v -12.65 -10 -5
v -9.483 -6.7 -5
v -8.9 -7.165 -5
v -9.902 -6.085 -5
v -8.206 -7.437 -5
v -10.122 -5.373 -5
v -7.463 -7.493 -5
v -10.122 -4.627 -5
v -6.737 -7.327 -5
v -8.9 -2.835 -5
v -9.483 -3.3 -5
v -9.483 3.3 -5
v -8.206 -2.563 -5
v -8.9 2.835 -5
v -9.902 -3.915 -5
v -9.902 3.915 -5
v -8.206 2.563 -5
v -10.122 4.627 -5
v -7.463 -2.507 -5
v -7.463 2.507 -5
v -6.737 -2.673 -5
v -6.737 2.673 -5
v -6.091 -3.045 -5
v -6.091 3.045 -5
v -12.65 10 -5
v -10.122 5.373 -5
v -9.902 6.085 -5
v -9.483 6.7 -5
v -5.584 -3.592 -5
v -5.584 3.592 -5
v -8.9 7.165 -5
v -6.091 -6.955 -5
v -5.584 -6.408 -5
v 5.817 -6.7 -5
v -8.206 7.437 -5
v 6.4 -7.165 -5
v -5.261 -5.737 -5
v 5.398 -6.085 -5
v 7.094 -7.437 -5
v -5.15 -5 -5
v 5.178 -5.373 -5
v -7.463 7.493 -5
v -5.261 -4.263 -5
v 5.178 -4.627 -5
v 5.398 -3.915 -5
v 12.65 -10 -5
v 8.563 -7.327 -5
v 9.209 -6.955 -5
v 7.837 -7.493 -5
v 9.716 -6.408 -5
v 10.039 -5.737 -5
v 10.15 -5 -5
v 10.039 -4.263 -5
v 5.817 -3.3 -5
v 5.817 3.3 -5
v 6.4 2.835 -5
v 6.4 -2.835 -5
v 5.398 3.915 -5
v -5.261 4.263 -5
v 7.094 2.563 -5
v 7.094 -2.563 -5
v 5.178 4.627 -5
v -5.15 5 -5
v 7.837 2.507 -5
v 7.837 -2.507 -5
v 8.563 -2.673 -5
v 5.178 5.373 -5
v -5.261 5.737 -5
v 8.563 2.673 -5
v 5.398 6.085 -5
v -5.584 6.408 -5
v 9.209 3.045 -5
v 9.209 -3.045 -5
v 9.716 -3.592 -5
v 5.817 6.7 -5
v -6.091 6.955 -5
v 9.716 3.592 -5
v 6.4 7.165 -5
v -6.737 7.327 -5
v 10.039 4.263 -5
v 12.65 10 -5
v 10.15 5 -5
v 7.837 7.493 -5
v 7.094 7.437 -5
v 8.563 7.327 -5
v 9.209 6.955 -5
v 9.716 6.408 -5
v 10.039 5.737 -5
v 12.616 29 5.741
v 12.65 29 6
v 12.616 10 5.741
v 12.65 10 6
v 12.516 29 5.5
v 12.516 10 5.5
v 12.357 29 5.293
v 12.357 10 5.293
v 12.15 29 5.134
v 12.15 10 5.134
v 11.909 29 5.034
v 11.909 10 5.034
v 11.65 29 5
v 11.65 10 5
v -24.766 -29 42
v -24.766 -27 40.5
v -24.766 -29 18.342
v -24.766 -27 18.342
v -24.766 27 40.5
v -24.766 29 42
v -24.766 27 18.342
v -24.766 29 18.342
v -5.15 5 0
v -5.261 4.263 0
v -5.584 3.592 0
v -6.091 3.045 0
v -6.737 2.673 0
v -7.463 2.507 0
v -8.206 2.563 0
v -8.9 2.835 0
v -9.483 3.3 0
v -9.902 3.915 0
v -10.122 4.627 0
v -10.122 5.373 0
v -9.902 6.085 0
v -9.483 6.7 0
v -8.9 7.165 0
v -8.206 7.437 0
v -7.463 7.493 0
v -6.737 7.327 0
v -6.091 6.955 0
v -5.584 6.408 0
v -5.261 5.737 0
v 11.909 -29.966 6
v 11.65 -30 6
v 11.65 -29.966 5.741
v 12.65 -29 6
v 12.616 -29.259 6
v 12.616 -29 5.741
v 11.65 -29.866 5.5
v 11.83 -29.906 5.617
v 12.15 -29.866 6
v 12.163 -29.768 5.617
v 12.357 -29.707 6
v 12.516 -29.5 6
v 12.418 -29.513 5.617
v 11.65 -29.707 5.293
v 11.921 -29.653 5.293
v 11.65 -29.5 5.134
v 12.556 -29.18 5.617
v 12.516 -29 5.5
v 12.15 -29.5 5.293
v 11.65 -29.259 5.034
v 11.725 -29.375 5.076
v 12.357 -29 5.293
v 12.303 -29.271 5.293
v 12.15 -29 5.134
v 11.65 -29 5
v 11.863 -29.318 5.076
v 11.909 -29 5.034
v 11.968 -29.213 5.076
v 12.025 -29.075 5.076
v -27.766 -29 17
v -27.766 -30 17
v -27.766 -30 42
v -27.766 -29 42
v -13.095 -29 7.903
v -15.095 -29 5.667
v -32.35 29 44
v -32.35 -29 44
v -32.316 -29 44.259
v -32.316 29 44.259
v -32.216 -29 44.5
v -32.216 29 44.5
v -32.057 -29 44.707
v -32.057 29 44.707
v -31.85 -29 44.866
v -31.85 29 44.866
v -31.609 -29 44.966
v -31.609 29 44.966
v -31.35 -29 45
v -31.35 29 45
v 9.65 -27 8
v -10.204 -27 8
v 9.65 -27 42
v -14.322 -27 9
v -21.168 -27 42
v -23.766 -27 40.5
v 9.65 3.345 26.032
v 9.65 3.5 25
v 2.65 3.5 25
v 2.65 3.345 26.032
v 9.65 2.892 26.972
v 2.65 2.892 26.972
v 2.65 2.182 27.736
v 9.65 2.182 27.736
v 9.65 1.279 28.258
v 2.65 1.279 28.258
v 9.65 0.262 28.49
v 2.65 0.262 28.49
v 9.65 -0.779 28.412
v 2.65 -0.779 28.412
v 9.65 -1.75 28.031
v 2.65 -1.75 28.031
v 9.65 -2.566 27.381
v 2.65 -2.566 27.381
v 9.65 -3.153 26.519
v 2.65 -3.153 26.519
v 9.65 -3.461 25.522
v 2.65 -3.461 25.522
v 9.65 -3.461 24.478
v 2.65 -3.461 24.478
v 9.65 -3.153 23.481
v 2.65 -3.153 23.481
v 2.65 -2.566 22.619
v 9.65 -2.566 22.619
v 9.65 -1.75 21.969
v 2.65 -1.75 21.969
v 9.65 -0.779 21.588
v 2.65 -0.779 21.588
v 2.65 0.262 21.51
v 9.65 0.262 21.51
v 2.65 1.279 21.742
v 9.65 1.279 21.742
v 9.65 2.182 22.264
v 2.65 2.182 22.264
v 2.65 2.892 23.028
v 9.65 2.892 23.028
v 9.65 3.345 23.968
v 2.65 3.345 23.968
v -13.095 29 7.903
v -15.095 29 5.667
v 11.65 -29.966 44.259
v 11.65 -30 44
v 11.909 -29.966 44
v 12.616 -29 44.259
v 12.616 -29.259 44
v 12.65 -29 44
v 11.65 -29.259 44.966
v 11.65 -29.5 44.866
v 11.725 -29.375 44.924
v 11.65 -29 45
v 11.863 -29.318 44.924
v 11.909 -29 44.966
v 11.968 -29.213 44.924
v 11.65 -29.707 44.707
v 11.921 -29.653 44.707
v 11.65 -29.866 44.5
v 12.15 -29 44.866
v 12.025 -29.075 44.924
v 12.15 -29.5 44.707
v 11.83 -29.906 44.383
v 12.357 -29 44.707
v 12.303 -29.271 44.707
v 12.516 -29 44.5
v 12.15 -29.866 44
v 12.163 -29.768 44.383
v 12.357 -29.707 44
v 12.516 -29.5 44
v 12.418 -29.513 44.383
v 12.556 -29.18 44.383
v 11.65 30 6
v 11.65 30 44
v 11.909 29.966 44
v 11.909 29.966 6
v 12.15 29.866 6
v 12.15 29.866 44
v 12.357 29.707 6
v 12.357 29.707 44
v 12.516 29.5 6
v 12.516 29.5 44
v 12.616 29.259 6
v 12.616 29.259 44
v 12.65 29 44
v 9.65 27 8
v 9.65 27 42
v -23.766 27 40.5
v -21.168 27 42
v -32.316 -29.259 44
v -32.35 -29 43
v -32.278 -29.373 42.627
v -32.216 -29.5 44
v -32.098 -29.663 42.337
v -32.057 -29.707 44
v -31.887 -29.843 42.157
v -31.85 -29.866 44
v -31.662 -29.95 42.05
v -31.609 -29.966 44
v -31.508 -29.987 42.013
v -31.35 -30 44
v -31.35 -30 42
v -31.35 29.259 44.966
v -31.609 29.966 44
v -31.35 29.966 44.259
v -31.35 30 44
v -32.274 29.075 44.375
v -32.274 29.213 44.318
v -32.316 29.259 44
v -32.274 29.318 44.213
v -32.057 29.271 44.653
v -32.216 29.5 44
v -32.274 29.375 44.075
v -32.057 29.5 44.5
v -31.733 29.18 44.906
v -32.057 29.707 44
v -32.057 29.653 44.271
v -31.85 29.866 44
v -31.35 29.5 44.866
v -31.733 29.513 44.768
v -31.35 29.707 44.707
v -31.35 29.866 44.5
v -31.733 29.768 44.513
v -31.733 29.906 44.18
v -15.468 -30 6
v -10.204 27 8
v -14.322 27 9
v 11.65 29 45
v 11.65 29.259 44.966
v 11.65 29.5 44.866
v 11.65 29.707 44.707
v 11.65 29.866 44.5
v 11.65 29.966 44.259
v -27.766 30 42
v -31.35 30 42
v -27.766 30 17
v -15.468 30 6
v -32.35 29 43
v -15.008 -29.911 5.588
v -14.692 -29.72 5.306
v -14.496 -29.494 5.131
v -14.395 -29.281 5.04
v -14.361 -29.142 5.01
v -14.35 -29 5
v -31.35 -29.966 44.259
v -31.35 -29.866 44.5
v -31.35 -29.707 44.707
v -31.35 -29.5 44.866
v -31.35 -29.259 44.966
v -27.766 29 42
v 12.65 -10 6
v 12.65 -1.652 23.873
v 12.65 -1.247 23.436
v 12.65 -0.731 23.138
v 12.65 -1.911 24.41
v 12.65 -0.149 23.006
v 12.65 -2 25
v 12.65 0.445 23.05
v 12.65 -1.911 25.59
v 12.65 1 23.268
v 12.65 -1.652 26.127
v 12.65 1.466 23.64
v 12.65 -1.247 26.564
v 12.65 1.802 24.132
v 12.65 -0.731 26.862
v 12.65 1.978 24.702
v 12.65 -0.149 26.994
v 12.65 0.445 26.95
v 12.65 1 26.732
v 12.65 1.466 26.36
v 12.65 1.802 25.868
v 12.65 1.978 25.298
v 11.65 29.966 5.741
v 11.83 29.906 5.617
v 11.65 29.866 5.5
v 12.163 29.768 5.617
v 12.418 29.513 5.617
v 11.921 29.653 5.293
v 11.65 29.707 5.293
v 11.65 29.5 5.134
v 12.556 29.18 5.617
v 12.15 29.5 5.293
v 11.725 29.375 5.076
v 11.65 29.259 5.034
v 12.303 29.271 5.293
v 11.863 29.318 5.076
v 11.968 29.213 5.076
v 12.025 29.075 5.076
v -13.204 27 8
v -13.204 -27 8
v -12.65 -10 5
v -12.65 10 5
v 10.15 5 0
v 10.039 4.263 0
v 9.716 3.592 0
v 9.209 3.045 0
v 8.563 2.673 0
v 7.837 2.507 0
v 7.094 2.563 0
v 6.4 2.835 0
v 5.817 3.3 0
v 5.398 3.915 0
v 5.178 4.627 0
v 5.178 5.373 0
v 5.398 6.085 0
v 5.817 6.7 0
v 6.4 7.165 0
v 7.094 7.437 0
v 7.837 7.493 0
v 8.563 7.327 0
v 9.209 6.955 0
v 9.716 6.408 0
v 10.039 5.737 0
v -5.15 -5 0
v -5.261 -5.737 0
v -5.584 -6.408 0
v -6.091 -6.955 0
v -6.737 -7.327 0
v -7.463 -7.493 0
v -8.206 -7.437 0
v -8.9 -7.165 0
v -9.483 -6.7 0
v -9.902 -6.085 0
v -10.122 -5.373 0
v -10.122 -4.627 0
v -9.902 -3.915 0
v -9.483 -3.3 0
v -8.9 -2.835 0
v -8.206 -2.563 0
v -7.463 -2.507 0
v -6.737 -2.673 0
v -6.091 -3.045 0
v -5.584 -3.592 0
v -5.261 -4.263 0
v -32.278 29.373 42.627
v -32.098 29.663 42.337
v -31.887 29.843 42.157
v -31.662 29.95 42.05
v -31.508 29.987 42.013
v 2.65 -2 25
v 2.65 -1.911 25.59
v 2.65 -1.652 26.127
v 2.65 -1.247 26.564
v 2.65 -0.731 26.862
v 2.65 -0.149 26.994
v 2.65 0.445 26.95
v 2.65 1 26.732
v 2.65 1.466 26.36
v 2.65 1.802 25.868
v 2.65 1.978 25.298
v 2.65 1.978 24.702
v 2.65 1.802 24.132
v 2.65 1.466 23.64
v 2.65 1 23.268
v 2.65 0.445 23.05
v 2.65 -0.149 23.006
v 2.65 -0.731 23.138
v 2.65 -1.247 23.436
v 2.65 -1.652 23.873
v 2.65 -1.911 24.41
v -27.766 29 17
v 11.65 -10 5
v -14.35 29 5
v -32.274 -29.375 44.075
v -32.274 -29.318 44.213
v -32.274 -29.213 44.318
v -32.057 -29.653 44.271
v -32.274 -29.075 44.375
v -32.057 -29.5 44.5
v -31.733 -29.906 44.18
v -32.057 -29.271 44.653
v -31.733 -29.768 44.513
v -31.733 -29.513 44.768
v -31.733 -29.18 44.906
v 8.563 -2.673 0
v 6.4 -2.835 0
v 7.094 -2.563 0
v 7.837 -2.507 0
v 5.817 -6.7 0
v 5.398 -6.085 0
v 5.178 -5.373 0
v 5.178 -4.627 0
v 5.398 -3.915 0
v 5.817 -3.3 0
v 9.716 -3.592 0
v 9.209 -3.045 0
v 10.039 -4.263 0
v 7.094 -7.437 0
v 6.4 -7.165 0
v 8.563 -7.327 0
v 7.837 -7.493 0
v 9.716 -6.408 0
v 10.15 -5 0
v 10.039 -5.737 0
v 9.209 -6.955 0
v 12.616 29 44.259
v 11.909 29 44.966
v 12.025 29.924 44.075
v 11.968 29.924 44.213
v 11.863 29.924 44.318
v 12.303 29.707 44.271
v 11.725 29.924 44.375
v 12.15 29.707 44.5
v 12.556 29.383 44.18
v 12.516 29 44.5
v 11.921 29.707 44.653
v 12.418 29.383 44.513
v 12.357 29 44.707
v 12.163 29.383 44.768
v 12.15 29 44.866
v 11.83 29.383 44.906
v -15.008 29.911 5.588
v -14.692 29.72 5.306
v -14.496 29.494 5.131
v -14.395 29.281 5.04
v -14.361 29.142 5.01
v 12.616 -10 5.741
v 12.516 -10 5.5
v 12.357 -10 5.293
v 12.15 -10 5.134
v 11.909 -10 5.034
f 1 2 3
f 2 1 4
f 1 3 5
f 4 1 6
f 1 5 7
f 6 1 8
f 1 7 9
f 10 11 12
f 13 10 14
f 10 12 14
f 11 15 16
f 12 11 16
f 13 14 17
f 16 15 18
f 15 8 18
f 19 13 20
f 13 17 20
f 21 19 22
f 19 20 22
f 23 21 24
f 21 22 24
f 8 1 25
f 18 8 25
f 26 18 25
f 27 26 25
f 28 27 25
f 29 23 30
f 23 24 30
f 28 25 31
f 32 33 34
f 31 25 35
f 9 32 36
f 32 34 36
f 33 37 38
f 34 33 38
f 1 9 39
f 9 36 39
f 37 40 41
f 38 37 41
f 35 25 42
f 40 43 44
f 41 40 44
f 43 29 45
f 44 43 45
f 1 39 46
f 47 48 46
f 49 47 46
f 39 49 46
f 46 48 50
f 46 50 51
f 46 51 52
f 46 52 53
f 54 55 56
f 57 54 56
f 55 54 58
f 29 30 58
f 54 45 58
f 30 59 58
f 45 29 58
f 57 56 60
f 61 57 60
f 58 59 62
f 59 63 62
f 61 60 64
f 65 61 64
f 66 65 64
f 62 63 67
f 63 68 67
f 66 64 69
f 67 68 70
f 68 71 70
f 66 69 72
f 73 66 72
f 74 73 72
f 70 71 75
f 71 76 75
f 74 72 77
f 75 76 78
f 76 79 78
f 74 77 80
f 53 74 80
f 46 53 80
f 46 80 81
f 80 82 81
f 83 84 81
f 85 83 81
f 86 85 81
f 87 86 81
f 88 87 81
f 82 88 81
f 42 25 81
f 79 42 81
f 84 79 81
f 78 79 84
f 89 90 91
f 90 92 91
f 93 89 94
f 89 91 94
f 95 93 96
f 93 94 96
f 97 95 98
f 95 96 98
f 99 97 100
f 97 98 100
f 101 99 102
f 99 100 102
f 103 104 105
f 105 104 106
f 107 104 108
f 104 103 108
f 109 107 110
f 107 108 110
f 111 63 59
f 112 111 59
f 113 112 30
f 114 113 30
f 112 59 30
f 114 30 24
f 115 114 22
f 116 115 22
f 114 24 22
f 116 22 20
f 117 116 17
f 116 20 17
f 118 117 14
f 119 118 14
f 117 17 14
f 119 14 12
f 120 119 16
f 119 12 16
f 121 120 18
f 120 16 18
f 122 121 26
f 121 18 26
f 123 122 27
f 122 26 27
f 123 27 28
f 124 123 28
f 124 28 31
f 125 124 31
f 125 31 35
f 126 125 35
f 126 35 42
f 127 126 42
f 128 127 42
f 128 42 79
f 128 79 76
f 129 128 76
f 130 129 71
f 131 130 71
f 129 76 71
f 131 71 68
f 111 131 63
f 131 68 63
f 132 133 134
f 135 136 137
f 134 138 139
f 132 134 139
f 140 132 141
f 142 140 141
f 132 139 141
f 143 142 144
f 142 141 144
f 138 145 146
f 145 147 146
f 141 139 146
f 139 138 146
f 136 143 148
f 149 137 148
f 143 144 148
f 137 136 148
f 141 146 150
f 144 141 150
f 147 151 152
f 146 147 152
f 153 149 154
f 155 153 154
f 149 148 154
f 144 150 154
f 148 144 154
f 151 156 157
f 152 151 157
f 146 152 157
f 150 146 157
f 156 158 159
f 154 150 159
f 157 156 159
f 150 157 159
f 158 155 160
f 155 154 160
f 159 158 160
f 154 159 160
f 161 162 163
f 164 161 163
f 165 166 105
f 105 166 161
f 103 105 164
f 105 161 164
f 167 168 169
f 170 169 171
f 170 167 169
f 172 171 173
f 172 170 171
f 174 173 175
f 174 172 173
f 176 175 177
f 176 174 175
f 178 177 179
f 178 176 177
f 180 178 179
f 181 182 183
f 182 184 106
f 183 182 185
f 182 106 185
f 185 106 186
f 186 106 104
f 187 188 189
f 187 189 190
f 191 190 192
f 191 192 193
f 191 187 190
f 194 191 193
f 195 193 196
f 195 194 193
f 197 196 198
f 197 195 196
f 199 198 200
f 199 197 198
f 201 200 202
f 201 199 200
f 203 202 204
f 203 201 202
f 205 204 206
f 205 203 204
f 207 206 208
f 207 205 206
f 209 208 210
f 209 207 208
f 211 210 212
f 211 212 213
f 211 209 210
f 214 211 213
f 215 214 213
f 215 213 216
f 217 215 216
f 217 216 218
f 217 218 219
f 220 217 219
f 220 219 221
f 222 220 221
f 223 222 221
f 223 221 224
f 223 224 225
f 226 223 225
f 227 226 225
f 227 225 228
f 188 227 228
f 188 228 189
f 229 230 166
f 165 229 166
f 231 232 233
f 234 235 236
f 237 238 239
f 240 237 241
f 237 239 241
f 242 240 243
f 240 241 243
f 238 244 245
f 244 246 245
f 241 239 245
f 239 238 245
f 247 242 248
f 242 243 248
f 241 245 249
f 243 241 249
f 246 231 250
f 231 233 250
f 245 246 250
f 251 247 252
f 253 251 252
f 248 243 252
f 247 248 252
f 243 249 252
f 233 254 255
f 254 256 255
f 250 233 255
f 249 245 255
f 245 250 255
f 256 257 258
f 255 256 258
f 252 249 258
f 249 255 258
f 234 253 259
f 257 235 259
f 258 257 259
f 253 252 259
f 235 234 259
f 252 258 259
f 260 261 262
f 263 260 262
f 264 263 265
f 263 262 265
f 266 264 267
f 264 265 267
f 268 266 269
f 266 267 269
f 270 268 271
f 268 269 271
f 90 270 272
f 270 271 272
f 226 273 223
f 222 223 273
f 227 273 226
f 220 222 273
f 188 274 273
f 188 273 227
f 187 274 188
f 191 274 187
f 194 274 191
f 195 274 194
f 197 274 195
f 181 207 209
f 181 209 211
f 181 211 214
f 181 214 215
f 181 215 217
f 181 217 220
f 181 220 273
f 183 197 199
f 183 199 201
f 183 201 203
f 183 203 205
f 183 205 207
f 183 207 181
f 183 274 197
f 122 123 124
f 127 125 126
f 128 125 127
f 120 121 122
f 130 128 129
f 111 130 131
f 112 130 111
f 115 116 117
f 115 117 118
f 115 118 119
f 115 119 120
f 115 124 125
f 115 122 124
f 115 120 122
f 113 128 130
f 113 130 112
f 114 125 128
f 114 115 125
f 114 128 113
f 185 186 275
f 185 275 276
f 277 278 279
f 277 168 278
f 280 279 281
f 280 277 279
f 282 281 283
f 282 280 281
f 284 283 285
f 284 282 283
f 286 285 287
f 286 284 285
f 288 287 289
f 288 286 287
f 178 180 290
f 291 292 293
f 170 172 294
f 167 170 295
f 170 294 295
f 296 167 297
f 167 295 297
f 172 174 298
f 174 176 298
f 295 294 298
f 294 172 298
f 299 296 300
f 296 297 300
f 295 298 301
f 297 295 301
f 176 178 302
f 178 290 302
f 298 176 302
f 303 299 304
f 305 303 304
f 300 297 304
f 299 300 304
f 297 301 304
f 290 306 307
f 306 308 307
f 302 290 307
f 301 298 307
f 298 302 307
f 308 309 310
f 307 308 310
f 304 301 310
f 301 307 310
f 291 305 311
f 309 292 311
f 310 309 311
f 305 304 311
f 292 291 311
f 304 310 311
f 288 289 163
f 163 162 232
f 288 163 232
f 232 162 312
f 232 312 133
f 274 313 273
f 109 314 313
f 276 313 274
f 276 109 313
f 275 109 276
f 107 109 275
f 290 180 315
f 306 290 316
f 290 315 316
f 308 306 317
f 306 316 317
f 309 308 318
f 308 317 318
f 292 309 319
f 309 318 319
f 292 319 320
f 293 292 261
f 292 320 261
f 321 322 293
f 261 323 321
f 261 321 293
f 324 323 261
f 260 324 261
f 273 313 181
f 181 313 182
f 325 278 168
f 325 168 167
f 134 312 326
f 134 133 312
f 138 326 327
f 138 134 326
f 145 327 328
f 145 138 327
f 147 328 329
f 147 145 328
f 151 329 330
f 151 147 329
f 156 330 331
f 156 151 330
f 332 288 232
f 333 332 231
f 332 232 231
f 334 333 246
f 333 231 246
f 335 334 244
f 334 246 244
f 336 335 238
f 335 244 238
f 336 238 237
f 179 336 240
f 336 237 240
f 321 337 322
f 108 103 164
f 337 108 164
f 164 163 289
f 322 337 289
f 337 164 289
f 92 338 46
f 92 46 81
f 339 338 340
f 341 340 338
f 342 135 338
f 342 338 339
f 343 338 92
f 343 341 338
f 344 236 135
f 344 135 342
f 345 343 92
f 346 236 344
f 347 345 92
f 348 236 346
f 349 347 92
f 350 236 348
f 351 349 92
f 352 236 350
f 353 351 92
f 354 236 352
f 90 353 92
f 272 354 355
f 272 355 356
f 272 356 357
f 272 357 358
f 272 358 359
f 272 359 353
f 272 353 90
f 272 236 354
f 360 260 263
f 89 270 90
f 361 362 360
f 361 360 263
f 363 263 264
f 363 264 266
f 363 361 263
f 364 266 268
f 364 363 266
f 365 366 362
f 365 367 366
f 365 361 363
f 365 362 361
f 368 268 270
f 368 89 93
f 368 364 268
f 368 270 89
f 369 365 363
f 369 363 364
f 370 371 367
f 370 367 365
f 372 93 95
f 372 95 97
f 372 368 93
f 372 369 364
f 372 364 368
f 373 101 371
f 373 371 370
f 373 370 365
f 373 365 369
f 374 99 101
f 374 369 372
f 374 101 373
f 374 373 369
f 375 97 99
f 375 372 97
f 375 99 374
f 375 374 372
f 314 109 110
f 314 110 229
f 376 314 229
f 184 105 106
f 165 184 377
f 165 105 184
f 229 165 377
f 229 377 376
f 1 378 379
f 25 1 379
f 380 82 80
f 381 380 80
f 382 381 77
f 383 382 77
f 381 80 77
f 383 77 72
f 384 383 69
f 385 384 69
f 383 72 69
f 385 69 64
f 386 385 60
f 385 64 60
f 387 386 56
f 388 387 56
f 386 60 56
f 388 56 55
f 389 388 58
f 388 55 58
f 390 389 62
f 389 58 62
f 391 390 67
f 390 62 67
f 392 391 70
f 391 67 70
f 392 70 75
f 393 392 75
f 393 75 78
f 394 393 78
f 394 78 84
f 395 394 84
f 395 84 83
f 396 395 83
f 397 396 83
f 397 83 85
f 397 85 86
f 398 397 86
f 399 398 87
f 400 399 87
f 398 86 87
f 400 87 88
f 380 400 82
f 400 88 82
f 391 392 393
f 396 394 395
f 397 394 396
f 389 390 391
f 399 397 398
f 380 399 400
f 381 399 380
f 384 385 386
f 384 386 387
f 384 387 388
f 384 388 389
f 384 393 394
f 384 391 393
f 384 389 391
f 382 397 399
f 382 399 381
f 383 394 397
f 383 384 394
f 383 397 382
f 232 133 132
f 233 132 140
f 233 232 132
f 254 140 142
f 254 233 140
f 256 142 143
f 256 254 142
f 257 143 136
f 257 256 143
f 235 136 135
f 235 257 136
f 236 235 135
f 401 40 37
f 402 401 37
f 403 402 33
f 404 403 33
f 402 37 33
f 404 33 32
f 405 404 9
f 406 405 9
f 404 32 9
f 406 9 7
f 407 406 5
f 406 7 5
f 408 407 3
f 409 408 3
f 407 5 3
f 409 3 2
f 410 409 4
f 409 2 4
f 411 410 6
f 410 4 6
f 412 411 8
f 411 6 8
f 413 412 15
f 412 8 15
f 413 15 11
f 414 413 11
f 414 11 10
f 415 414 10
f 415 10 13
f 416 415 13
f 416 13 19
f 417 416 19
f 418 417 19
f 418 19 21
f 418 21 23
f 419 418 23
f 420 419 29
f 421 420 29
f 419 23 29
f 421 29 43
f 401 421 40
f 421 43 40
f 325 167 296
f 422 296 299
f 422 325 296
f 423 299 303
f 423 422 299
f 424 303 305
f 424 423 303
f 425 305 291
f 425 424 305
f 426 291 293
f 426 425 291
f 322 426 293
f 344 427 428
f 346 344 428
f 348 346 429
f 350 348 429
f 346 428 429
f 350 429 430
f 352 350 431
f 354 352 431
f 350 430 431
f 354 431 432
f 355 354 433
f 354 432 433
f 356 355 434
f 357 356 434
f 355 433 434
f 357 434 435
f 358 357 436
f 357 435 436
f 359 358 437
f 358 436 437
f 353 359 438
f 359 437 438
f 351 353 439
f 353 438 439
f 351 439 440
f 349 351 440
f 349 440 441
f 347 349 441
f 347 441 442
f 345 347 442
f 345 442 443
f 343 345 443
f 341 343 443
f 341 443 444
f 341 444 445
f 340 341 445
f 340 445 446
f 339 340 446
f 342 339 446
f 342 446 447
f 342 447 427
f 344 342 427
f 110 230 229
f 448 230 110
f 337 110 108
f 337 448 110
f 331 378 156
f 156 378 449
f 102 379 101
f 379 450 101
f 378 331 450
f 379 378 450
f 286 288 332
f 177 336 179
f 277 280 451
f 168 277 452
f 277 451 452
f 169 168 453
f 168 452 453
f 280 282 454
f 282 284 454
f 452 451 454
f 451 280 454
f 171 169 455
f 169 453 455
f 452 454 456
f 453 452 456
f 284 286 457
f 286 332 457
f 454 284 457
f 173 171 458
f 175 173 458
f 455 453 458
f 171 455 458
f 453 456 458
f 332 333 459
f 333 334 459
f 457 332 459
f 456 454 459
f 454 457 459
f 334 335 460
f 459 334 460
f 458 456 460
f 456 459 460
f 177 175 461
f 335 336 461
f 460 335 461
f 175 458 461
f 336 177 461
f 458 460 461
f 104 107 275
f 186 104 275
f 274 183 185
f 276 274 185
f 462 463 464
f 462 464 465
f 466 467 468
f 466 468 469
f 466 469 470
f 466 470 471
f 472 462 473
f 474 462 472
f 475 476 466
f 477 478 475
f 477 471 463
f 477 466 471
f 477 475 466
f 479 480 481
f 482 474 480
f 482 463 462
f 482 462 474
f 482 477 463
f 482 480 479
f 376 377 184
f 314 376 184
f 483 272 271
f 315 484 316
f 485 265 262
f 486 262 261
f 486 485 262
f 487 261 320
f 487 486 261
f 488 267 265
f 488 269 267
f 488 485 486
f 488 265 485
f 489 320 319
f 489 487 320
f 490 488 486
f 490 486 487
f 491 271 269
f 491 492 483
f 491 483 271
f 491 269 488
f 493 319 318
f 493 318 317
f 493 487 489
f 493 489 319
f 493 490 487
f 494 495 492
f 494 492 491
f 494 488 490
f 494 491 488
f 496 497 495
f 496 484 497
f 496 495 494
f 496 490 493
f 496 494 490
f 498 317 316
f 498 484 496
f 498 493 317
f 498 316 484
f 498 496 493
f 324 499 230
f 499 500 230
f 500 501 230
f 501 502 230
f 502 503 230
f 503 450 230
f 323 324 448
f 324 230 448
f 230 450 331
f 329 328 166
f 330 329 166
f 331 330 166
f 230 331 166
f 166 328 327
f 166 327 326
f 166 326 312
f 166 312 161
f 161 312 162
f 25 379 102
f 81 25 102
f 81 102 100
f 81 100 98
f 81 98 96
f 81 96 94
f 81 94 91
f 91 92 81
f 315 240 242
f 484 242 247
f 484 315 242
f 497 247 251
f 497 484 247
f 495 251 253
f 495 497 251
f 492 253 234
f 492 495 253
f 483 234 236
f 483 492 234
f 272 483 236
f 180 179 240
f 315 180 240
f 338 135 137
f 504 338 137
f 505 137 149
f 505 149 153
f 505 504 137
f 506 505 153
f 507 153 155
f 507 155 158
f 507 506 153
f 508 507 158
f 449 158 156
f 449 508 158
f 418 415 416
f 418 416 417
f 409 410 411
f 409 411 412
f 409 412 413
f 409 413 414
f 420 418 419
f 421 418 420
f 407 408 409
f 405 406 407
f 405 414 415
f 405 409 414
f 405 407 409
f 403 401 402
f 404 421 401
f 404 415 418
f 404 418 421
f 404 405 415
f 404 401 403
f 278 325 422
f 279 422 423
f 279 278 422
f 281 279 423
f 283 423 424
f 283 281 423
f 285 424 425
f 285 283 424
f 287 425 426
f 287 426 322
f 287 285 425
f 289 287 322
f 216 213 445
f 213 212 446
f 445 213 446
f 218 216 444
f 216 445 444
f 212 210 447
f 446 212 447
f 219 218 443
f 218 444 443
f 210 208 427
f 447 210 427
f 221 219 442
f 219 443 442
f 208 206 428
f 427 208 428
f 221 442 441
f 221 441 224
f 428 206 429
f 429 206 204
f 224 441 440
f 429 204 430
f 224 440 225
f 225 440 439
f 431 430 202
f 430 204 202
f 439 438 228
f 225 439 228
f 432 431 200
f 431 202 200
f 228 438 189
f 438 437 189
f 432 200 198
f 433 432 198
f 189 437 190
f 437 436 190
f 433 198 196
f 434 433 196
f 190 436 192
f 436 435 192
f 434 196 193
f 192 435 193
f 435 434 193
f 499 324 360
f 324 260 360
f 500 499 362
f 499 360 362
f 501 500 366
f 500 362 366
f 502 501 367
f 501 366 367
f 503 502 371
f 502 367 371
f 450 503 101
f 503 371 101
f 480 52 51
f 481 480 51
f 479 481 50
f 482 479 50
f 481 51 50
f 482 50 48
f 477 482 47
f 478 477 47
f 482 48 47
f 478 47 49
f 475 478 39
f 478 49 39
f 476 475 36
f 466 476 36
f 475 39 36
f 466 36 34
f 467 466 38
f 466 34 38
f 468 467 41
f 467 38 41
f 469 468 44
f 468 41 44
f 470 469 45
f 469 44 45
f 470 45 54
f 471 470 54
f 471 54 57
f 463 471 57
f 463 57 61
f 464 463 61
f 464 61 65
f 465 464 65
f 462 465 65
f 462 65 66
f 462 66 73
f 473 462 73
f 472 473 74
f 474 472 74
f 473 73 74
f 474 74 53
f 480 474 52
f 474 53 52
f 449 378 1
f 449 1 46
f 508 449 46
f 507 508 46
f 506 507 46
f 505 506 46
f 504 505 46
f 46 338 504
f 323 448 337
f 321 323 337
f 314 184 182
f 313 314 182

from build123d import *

# Parameters (mm, degrees)
F0_W      = 25.3
F0_H      = 20
F1_DEPTH  = 5
F2_R      = 2.5
F3_DEPTH  = 5
F4_W      = 45
F4_H      = 60
F5_DEPTH  = 40
F6_W      = 54
F6_H      = 34
F7_DEPTH  = 42
F9_DEPTH  = 60
F10_W     = 58
F10_H     = 25
F11_DEPTH = 3
F12_W     = 17
F12_H     = 58
F13_DEPTH = 3
F14_R     = 1
F15_R     = 1
F17_DEPTH = 55
F18_R     = 3.5
F19_DEPTH = 10
F20_R     = 2
F21_DEPTH = 25
F23_DEPTH = 55


with BuildPart() as f1:
    # F0 (on Top) → F1 (new body, symmetric)
    with BuildSketch(Plane.XY):
        Rectangle(F0_W, F0_H)
    extrude(amount=F1_DEPTH, both=True)

    # F2 (on face) → F3 (cut)
    with BuildSketch(Plane(origin=(0, 0, -5), x_dir=(1, 0, 0), z_dir=(0, 0, -1))):
        with Locations((7.65, 5)):
            Circle(F2_R)
        with Locations((7.65, -5)):
            Circle(F2_R)
        with Locations((-7.65, -5)):
            Circle(F2_R)
        with Locations((-7.65, 5)):
            Circle(F2_R)
    extrude(amount=-F3_DEPTH, mode=Mode.SUBTRACT)

    # F4 (on face) → F5 (join)
    with BuildSketch(Plane.XY.offset(5)):
        with Locations((-9.85, 0)):
            Rectangle(F4_W, F4_H)
    extrude(amount=F5_DEPTH)

    # F6 (on face) → F7 (cut)
    with BuildSketch(Plane(origin=(-32.35, 0, 0), x_dir=(0, -1, 0), z_dir=(-1, 0, 0))):
        with Locations((0, 25)):
            Rectangle(F6_W, F6_H)
    extrude(amount=-F7_DEPTH, mode=Mode.SUBTRACT)

    # F8 (on face) → F9 (cut)
    with BuildSketch(Plane.XZ.offset(30)):
        Polygon((-27.766407865, 42), (-32.35, 42), (-32.35, 5), (-14.35, 5), (-27.766407865, 17), align=None)
    extrude(amount=-F9_DEPTH, mode=Mode.SUBTRACT)

    # F10 (on face) → F11 (cut)
    with BuildSketch(Plane(origin=(-27.766407865, 0, 0), x_dir=(0, -1, 0), z_dir=(-1, 0, 0))):
        with Locations((0, 29.5)):
            Rectangle(F10_W, F10_H)
    extrude(amount=-F11_DEPTH, mode=Mode.SUBTRACT)

    # F12 (on face) → F13 (cut)
    with BuildSketch(Plane(origin=(-3.8932578028, 0, -4.3527945505), x_dir=(0.7453559925, 0, -0.6666666667), z_dir=(-0.6666666667, 0, -0.7453559925))):
        with Locations((-23.5291918257, 0)):
            Rectangle(F12_W, F12_H)
    extrude(amount=-F13_DEPTH, mode=Mode.SUBTRACT)

    # F14
    f14_edges = [f1.edges().sort_by_distance(p)[0] for p in [
        (12.65, -30, 25),
        (-9.85, -30, 45),
        (12.65, 0, 45),
        (12.65, 30, 25),
        (-9.85, 30, 45),
    ]]
    fillet(f14_edges, radius=F14_R)

    # F15
    f15_edges = [f1.edges().sort_by_distance(p)[0] for p in [
        (-32.35, 0, 42),
        (-32.35, 0, 45),
        (-1.35, -30, 5),
        (-1.35, 30, 5),
    ]]
    fillet(f15_edges, radius=F15_R)

    # F16 (on face) → F17 (join)
    with BuildSketch(Plane.XZ.offset(-27)):
        Polygon((-21.1683316536, 42), (-24.766407865, 42), (-24.766407865, 40.5), (-23.766407865, 40.5), align=None)
    extrude(amount=F17_DEPTH)

    # F18 (on face) → F19 (join)
    with BuildSketch(Plane.YZ.offset(12.65)):
        with Locations((0, 25)):
            Circle(F18_R)
    extrude(amount=-F19_DEPTH)

    # F20 (on face) → F21 (cut)
    with BuildSketch(Plane(origin=(2.65, 0, 0), x_dir=(0, -1, 0), z_dir=(-1, 0, 0))):
        with Locations((0, 25)):
            Circle(F20_R)
    extrude(amount=-F21_DEPTH, mode=Mode.SUBTRACT)

    # F22 (on face) → F23 (join)
    with BuildSketch(Plane(origin=(0, -27, 0), x_dir=(-1, 0, 0), z_dir=(0, 1, 0))):
        Polygon((13.2041019662, 8), (14.322135955, 9), (10.2041019662, 8), align=None)
    extrude(amount=F23_DEPTH)


solid = f1.part
